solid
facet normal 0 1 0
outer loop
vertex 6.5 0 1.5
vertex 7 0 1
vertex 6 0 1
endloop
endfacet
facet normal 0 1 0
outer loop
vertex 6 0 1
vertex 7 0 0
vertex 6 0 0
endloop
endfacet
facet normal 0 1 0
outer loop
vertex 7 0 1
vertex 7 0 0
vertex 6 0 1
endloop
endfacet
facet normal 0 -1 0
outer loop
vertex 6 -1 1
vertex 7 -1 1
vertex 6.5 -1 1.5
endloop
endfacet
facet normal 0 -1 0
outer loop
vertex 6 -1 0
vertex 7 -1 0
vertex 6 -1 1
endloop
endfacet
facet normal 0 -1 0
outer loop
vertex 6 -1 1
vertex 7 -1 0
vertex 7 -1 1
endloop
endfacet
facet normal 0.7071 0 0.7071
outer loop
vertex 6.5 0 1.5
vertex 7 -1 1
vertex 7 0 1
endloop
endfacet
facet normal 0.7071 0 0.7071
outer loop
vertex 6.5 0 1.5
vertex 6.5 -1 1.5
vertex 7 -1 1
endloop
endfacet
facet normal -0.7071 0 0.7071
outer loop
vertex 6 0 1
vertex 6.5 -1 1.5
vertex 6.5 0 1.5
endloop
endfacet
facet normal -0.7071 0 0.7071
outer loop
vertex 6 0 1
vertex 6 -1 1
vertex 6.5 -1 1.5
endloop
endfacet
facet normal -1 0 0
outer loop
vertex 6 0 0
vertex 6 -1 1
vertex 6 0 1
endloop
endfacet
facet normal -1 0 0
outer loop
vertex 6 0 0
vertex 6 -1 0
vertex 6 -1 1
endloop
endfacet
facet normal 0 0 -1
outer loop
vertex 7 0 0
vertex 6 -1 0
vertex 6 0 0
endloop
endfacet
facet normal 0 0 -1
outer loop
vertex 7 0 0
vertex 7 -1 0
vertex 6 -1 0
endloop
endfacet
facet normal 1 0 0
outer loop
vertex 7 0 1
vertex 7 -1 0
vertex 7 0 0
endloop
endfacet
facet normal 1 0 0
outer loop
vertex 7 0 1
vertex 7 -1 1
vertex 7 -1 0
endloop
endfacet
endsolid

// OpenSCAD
// file: index.scad
// house module generator

module house(roof="flat",paint=[1,0,0]) {
        color(paint)
        if(roof=="flat") { 
                translate([0,-1,0]) cube(); 
        }
        else if(roof=="pitched") {
                rotate([90,0,0]) linear_extrude(height=1)
                polygon(points=[[0,0],[0,1],[0.5,1.5],[1,1],[1,0]]); 
        }
        else if(roof=="domical") {
                translate([0,-1,0]){
                translate([0.5,0.5,1]) sphere(r=0.5,$fn=20); cube(); }
        } 
}
// main file
// example for house module

include <index.scad>

translate([6,0,0]) house(roof="pitched",paint=[0,0,1]);
